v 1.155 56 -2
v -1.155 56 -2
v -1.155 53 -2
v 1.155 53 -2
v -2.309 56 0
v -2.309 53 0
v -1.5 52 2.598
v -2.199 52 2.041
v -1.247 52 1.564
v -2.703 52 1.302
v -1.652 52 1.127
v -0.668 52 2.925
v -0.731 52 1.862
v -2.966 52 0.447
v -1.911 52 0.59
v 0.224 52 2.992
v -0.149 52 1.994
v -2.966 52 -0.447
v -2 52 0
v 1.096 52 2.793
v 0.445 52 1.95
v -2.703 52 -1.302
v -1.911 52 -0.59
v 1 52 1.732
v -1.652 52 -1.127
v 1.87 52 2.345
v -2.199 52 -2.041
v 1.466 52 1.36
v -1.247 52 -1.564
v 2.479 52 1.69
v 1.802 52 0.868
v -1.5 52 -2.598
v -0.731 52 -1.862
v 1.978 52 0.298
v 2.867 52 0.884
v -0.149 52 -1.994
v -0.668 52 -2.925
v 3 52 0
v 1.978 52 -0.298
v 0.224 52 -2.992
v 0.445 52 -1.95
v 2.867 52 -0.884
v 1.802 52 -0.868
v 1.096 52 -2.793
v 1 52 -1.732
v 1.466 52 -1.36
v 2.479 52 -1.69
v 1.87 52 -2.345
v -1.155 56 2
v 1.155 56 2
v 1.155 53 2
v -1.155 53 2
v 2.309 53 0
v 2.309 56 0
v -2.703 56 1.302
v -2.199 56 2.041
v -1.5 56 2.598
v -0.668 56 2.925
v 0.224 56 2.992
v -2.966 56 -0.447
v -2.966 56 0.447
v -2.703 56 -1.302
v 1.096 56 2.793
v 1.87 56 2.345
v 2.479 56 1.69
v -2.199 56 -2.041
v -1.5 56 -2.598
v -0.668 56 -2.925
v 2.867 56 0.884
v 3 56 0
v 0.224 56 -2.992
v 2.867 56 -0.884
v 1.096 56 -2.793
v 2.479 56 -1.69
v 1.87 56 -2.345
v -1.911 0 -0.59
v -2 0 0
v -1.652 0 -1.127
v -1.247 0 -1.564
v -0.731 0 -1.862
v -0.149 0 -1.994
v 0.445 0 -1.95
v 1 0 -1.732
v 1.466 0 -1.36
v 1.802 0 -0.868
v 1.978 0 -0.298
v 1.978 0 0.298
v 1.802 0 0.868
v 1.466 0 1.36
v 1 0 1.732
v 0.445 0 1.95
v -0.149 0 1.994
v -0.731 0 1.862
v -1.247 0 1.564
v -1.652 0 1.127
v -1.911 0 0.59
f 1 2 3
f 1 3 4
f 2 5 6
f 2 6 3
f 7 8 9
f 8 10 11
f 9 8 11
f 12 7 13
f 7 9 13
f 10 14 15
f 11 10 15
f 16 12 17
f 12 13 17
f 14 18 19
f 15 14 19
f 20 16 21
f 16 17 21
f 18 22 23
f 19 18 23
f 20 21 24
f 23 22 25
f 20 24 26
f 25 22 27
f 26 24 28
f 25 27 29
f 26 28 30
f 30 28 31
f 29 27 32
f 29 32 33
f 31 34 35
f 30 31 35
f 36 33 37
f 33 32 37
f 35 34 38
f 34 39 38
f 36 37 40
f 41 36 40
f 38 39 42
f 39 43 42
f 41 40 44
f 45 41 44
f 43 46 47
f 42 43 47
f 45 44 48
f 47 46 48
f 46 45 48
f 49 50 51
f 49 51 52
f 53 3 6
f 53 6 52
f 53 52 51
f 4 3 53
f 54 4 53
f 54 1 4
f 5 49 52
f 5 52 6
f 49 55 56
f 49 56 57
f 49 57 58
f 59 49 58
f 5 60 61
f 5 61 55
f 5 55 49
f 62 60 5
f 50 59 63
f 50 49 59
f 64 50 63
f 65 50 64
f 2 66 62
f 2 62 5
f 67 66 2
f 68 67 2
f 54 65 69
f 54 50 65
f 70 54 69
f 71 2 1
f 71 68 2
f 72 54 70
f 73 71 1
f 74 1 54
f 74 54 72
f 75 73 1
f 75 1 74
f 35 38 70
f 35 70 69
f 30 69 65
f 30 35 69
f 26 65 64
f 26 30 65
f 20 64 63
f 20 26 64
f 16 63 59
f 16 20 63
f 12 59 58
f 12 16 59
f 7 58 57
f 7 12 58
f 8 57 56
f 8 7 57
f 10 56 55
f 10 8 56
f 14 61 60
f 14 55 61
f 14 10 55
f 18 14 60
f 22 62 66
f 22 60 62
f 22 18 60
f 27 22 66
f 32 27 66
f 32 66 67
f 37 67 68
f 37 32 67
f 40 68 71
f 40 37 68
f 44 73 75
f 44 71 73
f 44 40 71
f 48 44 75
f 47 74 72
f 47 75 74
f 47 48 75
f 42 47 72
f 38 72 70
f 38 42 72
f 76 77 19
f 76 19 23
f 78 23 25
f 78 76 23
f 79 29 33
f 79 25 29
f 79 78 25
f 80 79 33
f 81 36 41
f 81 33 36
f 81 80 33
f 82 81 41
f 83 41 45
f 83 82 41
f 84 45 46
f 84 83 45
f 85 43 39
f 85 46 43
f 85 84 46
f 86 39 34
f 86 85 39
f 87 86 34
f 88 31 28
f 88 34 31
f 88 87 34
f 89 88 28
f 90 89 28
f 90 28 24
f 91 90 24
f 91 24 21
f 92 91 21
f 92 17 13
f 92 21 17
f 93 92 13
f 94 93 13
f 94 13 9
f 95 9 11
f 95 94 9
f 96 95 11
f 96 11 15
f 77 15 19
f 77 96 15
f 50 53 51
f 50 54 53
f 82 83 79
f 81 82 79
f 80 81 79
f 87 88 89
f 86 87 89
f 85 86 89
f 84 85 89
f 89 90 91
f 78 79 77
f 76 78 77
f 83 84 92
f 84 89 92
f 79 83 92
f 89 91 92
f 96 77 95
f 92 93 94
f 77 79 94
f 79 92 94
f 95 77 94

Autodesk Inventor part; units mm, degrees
ref_plane "YZ Plane" through (0, 0, 0) normal (1, 0, 0) x (0, 1, 0)
ref_plane "XZ Plane" through (0, 0, 0) normal (0, 1, 0) x (-1, 0, 0)
ref_plane "XY Plane" through (0, 0, 0) normal (0, 0, 1) x (1, 0, 0)
sketch "Sketch1" plane through (0, 0, 0) normal (0, 1, 0) x (-1, 0, 0)
  circle A0 centre (0, 0) radius 2
  dimension "d0" = 4
extrude "Extrusion1" add sketch "Sketch1" along normal blind 52
thread "Thread1" size "M4x0.7" class "6g" standard "ANSI Metric M Profile" full length
sketch "Sketch2" plane through (0, 52, 0) normal (0, 1, 0) x (1, 0, 0)
  circle A0 centre (0, 0) radius 3
  dimension "d5" = 6
extrude "Extrusion2" add sketch "Sketch2" along normal blind 4
sketch "Sketch3" plane through (0, 56, 0) normal (0, 1, 0) x (1, 0, 0)
  circle A0 centre (0, 0) radius 2 projected
  line L0 (1.1547, 2) -> (2.3094, 0)
  line L1 (2.3094, 0) -> (1.1547, -2)
  line L2 (1.1547, -2) -> (-1.1547, -2)
  line L3 (-1.1547, -2) -> (-2.3094, 0)
  line L4 (-2.3094, 0) -> (-1.1547, 2)
  line L5 (-1.1547, 2) -> (1.1547, 2)
  point P0 (0, 2)
extrude "Extrusion3" cut sketch "Sketch3" against normal blind 3
properties part number "New Bolt" material "Steel"
